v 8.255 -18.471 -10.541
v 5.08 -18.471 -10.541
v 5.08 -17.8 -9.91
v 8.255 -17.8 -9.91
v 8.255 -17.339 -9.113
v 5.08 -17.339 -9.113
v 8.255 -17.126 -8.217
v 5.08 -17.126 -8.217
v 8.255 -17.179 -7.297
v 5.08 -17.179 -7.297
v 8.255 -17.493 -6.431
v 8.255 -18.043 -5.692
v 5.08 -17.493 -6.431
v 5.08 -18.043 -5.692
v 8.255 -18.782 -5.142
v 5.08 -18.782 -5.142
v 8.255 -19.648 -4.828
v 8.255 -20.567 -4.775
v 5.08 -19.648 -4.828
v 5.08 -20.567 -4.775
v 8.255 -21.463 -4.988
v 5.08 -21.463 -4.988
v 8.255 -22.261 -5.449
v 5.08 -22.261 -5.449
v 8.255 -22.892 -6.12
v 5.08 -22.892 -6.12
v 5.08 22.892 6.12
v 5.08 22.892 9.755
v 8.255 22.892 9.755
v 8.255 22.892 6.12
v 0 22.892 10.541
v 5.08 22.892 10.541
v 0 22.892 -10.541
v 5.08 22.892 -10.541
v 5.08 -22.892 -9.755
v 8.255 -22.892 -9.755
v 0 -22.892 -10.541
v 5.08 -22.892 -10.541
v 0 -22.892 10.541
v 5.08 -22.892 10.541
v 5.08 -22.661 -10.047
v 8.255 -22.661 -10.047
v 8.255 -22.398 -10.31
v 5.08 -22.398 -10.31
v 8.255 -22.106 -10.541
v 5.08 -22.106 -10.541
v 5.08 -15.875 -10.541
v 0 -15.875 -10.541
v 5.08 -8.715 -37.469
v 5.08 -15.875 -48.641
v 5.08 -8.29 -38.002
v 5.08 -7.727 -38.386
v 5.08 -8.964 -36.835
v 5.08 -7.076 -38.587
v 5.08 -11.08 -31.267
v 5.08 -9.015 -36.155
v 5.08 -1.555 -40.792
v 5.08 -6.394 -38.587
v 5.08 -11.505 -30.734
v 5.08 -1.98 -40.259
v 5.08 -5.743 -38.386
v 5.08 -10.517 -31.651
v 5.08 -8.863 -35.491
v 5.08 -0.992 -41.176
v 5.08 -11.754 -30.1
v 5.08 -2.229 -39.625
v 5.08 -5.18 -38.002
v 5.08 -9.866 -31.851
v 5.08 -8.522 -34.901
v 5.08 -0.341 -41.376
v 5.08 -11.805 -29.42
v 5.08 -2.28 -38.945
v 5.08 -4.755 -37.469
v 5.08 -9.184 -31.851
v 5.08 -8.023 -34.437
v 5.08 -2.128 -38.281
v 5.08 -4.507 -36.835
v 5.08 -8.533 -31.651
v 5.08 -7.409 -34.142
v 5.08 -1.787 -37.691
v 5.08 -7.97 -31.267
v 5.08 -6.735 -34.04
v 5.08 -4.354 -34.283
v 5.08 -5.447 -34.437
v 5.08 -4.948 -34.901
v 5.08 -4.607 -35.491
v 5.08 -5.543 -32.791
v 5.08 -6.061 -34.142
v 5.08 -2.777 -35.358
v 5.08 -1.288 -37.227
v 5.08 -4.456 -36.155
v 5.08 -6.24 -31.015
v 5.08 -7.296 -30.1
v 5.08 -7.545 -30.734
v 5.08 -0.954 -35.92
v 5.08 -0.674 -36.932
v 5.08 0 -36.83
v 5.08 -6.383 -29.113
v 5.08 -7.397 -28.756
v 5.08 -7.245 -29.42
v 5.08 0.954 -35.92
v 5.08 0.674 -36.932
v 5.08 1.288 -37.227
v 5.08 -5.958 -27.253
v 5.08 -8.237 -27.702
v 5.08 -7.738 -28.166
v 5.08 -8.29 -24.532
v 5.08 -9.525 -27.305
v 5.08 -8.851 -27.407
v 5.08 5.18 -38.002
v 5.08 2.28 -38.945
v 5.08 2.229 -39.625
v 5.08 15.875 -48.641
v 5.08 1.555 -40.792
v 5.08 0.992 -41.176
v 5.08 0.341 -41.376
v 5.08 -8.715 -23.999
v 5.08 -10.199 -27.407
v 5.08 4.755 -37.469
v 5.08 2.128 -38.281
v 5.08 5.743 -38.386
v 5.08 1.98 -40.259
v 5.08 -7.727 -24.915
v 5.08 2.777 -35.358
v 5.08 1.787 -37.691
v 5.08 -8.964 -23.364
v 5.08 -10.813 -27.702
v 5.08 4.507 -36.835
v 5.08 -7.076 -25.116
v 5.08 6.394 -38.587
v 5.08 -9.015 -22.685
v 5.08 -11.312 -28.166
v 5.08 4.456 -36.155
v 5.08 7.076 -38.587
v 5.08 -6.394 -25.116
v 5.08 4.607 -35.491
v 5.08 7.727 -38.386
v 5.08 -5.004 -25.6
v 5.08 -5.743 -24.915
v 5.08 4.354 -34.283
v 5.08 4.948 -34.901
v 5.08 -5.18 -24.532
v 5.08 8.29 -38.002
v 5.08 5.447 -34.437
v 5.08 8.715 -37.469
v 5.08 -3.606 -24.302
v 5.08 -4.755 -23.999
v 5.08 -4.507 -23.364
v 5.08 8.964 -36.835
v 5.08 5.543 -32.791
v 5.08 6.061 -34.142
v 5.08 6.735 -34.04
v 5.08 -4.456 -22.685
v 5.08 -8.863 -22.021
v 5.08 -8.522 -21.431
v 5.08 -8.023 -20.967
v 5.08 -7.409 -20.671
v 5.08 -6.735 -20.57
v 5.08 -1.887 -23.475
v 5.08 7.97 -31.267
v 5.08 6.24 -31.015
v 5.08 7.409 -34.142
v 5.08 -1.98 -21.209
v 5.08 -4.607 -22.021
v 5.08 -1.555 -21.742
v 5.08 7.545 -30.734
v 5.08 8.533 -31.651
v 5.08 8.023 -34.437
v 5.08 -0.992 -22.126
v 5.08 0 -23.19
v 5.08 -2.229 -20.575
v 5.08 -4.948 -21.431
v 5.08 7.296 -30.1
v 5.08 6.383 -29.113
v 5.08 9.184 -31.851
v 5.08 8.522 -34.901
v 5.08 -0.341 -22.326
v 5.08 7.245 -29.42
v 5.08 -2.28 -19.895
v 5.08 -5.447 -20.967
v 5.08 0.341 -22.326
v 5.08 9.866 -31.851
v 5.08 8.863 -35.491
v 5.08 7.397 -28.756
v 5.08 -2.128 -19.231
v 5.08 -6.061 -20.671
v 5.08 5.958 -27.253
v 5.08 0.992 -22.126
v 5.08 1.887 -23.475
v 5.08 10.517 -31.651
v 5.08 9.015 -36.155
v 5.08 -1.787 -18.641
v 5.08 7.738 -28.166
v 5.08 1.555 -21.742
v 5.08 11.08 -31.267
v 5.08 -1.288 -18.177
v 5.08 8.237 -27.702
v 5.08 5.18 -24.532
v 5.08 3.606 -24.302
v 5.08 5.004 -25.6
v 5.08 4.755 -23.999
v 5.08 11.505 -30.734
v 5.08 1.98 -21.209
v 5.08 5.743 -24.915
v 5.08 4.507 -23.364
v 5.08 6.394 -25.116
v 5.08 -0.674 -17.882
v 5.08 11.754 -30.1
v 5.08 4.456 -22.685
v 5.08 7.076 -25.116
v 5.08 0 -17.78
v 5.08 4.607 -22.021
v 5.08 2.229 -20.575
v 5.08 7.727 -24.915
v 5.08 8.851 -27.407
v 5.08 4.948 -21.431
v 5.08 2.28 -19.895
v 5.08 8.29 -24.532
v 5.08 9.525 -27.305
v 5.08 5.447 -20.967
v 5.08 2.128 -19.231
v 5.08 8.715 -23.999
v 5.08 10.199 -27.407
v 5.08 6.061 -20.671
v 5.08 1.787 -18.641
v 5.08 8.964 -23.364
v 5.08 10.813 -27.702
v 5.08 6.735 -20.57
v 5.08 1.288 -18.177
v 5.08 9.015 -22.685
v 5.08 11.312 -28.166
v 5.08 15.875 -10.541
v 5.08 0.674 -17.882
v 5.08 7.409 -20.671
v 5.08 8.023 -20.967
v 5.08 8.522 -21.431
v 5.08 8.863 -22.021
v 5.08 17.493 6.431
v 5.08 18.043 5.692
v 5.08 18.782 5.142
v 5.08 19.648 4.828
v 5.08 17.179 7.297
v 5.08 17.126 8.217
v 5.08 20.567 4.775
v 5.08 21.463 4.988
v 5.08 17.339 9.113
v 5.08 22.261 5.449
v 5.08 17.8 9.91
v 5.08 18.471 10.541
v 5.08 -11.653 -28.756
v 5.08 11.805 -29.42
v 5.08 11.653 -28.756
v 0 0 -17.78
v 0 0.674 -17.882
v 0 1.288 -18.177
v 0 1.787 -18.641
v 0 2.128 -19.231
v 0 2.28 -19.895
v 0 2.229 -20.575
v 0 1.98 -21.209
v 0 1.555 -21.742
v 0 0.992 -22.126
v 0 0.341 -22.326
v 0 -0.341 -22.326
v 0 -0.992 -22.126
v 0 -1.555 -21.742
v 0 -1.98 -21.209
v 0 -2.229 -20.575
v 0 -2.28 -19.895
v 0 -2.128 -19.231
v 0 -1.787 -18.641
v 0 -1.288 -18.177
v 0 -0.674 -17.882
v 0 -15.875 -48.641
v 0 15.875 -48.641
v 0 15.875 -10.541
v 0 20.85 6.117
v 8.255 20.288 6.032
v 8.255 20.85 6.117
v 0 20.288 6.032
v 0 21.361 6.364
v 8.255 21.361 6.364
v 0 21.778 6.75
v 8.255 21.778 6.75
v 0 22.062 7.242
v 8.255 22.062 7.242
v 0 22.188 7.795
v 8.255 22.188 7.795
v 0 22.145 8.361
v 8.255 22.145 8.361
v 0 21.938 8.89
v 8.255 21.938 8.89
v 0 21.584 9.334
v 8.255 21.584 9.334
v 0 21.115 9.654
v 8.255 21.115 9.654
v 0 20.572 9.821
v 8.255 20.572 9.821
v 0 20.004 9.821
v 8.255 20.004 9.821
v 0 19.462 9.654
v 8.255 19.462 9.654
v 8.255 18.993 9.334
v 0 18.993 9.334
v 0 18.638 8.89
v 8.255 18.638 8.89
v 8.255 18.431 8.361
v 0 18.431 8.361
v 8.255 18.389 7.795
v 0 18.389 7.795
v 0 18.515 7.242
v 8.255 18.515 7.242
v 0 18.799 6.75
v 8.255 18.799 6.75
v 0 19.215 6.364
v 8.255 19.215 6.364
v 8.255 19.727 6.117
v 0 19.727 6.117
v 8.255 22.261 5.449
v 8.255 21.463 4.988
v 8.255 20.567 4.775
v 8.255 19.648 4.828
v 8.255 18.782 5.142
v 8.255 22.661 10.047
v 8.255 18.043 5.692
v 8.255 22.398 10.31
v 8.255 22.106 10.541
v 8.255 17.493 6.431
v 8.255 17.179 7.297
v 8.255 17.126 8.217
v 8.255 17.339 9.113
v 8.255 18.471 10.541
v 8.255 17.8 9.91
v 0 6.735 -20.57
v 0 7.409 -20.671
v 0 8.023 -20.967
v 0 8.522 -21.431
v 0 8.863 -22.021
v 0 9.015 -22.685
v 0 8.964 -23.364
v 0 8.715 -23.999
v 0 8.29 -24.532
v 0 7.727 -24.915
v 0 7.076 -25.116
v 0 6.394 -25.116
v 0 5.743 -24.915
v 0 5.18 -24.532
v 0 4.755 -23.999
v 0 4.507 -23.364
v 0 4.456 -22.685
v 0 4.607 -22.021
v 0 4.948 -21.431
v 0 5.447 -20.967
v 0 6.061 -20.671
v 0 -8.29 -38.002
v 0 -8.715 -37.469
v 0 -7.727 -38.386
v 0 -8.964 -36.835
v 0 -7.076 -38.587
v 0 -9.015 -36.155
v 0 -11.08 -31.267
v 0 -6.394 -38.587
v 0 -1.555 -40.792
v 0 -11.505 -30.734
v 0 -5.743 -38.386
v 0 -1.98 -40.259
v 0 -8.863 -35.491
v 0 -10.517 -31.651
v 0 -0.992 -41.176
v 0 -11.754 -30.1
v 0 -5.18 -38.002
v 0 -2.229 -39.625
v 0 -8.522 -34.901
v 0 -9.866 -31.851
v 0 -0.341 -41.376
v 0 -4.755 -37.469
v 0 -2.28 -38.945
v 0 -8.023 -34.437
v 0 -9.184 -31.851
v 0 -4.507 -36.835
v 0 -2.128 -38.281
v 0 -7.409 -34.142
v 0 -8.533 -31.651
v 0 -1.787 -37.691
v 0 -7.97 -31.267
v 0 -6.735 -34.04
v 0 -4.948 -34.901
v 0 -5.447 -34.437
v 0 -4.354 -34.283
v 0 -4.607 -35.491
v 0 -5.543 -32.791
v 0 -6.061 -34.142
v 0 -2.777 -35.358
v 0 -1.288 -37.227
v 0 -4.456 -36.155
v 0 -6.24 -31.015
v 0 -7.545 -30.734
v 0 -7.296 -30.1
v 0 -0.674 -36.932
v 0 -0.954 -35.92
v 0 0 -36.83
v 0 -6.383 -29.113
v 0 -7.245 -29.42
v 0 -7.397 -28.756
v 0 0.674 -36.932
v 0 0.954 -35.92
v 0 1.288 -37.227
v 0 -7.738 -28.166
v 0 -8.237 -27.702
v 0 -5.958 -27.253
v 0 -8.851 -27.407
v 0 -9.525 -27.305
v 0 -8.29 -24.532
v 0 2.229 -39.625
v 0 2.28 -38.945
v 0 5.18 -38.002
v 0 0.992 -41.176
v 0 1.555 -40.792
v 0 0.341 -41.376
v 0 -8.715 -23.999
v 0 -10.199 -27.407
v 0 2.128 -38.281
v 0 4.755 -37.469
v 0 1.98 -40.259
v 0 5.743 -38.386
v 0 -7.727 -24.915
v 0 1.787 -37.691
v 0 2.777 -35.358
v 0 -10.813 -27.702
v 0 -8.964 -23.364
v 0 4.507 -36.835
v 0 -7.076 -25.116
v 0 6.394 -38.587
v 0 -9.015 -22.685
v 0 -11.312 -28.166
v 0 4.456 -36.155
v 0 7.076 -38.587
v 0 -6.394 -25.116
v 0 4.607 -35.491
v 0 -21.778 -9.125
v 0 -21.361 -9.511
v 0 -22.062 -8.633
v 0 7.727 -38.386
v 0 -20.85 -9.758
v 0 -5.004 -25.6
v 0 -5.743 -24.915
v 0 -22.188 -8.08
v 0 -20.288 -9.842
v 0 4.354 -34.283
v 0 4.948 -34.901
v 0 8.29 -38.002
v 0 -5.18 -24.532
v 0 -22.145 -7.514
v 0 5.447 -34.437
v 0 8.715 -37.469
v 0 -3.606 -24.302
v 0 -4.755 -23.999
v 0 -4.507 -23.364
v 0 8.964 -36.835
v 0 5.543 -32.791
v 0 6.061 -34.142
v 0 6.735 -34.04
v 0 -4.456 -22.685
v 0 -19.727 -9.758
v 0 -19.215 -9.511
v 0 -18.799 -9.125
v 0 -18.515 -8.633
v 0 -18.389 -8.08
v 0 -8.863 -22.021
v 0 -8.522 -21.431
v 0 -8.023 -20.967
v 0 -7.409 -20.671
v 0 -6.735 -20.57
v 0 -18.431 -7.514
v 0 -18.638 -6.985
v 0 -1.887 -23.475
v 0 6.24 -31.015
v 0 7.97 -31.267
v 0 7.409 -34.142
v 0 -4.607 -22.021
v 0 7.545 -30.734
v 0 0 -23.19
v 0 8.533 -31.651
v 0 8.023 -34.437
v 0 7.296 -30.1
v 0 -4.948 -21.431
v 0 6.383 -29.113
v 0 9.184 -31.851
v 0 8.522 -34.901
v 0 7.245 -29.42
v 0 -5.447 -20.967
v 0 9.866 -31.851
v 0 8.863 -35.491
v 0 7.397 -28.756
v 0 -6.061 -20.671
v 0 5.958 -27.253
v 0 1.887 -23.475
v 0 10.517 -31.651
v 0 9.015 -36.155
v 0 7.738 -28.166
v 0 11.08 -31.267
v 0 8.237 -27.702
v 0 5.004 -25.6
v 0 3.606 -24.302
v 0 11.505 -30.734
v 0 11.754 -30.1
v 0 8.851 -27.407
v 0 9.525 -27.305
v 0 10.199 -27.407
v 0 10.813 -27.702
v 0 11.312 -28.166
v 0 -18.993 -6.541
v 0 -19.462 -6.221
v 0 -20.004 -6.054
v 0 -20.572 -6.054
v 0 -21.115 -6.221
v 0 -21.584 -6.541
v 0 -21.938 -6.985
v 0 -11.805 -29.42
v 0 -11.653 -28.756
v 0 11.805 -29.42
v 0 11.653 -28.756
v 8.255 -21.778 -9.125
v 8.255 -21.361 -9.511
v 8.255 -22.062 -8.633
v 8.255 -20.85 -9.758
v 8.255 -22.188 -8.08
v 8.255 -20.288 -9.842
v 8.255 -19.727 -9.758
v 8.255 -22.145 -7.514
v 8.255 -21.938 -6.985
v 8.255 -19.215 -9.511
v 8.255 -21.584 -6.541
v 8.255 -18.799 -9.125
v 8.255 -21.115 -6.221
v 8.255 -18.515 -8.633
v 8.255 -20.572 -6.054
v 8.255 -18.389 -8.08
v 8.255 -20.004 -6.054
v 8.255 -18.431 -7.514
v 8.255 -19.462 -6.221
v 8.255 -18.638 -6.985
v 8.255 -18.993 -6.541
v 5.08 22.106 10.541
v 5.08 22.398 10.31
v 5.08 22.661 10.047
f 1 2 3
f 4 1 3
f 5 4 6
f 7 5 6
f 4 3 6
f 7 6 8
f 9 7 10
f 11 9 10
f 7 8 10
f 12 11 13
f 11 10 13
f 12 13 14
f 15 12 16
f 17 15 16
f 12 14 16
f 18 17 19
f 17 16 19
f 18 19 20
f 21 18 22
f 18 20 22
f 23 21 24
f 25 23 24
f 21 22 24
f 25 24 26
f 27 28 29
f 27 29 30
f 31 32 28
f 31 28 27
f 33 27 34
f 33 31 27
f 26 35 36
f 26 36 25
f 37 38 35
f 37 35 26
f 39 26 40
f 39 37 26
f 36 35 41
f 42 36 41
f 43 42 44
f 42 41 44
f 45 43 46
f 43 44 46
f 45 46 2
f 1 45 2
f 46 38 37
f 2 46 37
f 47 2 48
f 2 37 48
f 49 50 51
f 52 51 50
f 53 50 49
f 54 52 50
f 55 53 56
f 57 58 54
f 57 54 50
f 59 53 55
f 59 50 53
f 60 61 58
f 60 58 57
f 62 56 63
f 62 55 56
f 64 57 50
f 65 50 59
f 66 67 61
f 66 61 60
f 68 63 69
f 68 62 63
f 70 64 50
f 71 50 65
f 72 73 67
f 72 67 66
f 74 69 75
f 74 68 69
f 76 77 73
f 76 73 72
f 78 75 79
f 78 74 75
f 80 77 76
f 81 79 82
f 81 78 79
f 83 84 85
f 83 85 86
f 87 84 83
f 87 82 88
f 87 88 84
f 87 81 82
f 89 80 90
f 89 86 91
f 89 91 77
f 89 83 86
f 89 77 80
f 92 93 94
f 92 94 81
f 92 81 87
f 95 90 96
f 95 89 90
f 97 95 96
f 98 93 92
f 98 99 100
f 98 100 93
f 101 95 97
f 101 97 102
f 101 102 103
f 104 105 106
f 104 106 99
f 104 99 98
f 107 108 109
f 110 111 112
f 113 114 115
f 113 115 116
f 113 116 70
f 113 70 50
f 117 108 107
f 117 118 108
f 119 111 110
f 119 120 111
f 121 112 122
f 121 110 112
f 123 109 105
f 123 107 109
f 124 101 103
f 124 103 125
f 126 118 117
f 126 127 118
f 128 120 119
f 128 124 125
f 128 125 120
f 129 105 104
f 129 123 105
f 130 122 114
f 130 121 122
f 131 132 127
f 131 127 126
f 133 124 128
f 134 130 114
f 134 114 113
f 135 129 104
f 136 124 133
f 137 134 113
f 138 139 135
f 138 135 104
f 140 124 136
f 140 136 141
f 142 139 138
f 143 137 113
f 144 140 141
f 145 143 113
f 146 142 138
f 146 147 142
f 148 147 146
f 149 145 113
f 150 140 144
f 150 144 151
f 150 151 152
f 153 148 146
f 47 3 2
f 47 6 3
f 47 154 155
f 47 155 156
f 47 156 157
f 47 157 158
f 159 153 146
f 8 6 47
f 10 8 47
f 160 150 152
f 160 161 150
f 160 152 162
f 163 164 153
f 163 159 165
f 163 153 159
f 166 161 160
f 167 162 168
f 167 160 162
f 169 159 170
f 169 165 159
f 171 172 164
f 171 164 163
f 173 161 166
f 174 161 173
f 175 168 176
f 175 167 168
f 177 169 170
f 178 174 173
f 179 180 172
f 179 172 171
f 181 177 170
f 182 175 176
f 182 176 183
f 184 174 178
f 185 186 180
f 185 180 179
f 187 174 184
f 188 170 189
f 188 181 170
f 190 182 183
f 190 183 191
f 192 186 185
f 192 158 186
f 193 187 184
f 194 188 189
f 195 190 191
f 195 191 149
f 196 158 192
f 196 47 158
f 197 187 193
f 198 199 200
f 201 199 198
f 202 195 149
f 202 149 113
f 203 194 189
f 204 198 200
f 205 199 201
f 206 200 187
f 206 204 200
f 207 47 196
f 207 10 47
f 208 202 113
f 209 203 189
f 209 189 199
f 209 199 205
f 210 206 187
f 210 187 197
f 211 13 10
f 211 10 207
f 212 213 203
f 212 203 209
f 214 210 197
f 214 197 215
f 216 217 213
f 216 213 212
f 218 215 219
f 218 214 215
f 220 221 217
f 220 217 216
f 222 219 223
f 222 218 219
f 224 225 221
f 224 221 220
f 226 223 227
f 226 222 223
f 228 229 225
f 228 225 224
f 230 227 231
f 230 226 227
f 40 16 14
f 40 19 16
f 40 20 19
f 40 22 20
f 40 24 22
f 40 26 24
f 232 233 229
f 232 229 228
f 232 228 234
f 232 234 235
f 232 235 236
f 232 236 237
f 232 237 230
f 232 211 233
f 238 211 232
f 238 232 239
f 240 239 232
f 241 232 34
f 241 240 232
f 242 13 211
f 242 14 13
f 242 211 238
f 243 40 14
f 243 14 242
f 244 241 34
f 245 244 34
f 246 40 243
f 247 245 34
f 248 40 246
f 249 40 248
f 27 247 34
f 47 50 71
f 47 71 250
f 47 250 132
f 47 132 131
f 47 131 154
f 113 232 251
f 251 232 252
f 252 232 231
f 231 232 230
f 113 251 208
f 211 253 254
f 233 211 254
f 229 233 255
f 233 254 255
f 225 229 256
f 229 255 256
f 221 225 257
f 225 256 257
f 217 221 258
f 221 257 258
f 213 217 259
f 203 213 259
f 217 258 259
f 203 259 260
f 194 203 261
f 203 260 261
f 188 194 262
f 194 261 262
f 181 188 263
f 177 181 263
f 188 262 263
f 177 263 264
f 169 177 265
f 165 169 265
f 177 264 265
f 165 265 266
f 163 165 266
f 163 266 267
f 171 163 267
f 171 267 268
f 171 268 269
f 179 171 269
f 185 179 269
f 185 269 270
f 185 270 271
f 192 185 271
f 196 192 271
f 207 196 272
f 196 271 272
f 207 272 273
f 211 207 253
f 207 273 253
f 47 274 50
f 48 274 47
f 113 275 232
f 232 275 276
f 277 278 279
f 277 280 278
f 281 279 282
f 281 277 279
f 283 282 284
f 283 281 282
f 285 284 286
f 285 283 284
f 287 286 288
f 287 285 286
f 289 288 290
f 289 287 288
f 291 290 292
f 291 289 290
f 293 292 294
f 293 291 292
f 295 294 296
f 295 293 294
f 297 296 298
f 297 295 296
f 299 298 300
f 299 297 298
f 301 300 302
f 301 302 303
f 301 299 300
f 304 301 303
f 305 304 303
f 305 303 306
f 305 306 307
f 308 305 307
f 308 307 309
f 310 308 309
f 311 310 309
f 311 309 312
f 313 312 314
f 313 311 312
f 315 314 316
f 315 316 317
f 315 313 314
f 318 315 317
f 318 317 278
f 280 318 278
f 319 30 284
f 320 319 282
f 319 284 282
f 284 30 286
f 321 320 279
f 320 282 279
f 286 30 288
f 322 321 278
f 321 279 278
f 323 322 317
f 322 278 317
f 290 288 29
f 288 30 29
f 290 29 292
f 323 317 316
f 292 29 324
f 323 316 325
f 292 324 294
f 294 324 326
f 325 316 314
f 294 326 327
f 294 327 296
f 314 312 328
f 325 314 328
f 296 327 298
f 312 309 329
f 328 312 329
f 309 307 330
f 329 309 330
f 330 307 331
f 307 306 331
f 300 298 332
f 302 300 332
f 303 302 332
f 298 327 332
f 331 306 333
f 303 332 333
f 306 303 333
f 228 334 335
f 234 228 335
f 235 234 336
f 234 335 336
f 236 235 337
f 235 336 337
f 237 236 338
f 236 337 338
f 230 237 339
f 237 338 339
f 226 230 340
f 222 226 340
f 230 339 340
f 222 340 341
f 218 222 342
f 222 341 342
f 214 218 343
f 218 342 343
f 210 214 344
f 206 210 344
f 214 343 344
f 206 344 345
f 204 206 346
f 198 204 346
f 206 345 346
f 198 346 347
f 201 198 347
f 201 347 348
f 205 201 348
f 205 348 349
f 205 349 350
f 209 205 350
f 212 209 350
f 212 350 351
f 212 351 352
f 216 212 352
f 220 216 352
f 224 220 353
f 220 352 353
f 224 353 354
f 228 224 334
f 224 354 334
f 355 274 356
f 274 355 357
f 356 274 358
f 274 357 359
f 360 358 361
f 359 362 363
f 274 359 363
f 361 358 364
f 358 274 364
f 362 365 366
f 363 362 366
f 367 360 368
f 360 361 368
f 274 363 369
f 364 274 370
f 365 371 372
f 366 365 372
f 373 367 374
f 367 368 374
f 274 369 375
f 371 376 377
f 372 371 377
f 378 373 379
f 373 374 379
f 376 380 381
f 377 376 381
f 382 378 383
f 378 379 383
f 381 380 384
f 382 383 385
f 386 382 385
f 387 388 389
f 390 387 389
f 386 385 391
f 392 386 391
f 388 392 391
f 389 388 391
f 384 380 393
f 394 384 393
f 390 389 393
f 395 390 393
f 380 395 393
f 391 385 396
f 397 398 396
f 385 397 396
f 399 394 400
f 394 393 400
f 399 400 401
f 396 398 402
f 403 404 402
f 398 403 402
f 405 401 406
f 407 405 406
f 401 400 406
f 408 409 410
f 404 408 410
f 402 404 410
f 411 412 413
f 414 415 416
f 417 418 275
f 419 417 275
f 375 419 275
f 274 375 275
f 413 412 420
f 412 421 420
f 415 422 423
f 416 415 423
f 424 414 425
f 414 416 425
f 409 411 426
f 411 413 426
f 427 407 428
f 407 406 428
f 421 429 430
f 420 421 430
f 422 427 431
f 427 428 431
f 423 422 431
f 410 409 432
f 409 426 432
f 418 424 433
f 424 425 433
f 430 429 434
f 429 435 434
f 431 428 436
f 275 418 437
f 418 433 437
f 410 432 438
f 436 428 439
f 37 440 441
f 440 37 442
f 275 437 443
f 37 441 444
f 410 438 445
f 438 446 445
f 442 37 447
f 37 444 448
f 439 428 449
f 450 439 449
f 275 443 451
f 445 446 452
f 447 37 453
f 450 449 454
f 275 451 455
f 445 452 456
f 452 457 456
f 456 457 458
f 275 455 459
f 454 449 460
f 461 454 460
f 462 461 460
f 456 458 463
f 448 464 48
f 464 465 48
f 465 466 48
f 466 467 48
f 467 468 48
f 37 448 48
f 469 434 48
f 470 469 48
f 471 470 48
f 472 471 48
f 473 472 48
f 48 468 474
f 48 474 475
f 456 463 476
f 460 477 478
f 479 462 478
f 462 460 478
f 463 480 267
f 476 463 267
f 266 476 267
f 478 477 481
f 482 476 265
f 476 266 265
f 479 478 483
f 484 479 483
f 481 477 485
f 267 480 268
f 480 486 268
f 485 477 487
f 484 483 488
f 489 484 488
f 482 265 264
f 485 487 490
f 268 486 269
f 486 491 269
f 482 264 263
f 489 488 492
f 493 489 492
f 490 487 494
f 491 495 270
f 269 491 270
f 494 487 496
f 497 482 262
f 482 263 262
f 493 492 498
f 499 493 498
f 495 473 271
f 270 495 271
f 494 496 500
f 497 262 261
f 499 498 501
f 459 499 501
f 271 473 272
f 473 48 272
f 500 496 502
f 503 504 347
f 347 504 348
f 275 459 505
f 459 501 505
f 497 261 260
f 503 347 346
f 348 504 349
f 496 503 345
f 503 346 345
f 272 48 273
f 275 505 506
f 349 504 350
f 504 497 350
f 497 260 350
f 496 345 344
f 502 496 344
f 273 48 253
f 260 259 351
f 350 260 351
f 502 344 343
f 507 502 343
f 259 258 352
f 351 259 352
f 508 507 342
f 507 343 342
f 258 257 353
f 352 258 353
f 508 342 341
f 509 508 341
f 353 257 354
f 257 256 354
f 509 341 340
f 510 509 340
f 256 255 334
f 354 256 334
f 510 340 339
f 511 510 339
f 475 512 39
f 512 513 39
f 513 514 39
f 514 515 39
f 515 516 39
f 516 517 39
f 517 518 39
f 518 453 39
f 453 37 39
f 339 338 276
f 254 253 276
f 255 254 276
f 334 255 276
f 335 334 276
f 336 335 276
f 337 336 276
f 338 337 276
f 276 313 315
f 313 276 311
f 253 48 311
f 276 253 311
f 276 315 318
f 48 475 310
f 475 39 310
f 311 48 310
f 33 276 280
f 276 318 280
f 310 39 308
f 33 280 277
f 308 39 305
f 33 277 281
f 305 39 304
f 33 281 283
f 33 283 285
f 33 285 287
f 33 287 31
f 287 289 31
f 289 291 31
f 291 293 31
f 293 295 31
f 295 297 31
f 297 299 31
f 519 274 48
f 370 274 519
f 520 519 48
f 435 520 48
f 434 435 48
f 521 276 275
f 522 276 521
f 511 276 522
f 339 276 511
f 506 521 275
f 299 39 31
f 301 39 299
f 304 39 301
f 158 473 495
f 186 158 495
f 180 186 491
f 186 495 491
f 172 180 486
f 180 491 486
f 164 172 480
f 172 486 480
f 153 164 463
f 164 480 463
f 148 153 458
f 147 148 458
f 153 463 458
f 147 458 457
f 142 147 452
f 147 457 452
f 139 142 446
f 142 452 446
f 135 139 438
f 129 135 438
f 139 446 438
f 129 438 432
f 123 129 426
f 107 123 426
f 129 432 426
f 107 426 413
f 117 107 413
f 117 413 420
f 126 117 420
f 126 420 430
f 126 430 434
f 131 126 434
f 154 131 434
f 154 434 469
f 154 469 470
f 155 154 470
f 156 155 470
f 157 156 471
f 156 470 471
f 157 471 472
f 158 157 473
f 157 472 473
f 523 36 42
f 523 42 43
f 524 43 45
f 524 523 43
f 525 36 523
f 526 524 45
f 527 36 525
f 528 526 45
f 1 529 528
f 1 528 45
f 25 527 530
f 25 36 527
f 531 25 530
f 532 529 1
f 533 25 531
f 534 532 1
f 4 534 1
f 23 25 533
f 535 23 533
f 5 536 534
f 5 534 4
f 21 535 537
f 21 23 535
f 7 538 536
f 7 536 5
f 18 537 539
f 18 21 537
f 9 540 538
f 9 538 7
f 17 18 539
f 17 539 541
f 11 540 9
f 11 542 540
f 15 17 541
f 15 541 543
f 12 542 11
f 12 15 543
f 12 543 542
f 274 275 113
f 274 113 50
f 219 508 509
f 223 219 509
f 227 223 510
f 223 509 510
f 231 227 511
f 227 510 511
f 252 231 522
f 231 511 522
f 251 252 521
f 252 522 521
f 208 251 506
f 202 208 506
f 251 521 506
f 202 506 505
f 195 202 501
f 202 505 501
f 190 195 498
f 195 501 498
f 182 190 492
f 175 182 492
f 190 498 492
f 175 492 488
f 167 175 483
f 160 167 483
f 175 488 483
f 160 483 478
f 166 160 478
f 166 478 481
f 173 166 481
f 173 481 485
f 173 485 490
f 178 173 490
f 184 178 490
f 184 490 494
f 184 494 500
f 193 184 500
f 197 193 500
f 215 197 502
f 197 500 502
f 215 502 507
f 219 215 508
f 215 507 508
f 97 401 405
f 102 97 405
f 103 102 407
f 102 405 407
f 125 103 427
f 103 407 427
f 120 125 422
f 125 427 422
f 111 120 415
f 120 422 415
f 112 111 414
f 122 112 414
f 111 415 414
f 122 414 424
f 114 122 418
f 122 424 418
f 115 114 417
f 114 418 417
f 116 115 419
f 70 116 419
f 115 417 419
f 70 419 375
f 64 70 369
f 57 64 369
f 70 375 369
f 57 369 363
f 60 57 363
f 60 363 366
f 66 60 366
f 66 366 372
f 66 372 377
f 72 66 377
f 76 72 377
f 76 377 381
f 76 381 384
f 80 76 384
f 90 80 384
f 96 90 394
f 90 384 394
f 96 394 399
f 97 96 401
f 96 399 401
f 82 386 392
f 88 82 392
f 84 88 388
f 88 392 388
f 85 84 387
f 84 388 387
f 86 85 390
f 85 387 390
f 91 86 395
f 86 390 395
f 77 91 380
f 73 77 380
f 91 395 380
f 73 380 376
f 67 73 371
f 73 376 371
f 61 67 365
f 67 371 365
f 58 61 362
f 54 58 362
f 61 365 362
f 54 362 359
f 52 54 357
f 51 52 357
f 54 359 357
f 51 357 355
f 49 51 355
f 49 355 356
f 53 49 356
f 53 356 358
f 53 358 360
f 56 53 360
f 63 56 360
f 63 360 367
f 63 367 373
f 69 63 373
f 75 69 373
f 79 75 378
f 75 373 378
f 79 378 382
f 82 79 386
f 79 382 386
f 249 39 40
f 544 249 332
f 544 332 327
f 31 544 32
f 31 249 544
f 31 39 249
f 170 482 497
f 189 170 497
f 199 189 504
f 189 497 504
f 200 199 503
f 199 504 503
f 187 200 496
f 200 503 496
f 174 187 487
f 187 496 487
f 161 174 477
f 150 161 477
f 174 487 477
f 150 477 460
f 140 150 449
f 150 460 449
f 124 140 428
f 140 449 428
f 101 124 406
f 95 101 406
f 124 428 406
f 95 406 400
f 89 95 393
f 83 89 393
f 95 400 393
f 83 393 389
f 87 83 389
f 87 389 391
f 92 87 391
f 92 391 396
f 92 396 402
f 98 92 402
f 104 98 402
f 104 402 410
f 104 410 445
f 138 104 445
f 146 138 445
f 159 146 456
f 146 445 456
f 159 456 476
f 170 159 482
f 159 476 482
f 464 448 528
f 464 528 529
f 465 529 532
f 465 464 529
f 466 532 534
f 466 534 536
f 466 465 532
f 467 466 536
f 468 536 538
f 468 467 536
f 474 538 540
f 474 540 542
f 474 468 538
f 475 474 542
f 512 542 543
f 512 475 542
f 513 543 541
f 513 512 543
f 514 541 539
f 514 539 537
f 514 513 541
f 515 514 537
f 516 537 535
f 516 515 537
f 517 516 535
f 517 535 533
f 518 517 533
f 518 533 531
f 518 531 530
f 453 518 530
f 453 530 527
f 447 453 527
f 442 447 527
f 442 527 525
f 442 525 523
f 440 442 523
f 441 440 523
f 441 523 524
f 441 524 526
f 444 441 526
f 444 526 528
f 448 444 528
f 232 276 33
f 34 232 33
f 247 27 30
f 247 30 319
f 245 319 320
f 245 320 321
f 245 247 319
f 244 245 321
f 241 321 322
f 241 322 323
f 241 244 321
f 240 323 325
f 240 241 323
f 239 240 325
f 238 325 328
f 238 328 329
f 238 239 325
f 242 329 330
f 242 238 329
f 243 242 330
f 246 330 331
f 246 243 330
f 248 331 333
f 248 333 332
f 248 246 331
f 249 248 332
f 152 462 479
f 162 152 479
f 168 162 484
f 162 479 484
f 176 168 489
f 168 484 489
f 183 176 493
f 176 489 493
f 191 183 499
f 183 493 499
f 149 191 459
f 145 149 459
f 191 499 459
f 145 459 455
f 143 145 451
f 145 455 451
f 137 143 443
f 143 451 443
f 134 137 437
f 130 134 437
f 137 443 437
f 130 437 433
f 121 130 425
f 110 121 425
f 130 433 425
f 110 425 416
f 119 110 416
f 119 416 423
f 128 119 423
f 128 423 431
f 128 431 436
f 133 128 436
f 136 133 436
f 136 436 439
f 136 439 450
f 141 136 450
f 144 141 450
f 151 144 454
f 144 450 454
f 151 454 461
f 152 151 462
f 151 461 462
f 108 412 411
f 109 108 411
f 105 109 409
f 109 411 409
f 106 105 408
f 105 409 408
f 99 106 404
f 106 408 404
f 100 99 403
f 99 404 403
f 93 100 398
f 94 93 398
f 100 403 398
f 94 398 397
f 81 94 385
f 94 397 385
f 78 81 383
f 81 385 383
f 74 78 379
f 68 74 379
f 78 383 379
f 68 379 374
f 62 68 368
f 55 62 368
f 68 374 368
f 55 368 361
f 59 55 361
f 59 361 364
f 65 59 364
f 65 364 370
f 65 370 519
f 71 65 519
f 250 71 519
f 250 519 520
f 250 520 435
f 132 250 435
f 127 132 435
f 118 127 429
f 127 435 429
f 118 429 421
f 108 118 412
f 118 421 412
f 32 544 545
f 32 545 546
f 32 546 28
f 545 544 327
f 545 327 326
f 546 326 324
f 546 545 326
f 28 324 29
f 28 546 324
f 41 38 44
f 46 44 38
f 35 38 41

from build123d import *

# Parameters (mm, degrees)
SKETCH1_W           = 45.7835
SKETCH1_H           = 21.082
SKETCH1_R           = 1.905
BOSS_EXTRUDE1_DEPTH = 5.08
SKETCH2_R           = 1.905
BOSS_EXTRUDE2_DEPTH = 3.175
SKETCH4_W           = 31.75
SKETCH4_H           = 38.1
SKETCH4_R           = 6.4008
SKETCH4_R_2         = 2.286
BOSS_EXTRUDE4_DEPTH = 5.08


with BuildPart() as part:
    # Sketch1 → Boss-Extrude1 (new body)
    with BuildSketch(Plane.YZ):
        Rectangle(SKETCH1_W, SKETCH1_H)
        with Locations(Location((-20.28825, -7.9375, 0), (0, 0, 270))):
            Circle(SKETCH1_R, mode=Mode.SUBTRACT)
        with Locations(Location((20.28825, 7.9375, 0), (0, 0, 270))):
            Circle(SKETCH1_R, mode=Mode.SUBTRACT)
    extrude(amount=BOSS_EXTRUDE1_DEPTH)

    # Sketch2 → Boss-Extrude2 (add)
    # profile 1 of 2: a face of its own
    with BuildSketch(Plane.YZ.offset(5.08)):
        with BuildLine():
            Line((18.470995821, 10.541), (22.105504179, 10.541))
            ThreePointArc((22.105504179, 10.541), (22.53331403, 10.18256403), (22.89175, 9.754754179))
            Line((22.89175, 9.754754179), (22.89175, 6.120245821))
            ThreePointArc((22.89175, 6.120245821), (18.04318597, 5.69243597), (18.470995821, 10.541))
        make_face()
        with Locations(Location((20.28825, 7.9375, 0), (0, 0, 270))):
            Circle(SKETCH2_R, mode=Mode.SUBTRACT)
    # profile 2 of 2: a face of its own
    with BuildSketch(Plane.YZ.offset(5.08)):
        with BuildLine():
            Line((-22.89175, -6.120245821), (-22.89175, -9.754754179))
            ThreePointArc((-22.89175, -9.754754179), (-22.53331403, -10.18256403), (-22.105504179, -10.541))
            Line((-22.105504179, -10.541), (-18.470995821, -10.541))
            ThreePointArc((-18.470995821, -10.541), (-18.04318597, -5.69243597), (-22.89175, -6.120245821))
        make_face()
        with Locations(Location((-20.28825, -7.9375, 0), (0, 0, 270))):
            Circle(SKETCH2_R, mode=Mode.SUBTRACT)
    extrude(amount=BOSS_EXTRUDE2_DEPTH)

    # Sketch4 → Boss-Extrude4 (add)
    with BuildSketch(Plane(origin=(0, 0, 0), x_dir=(0, -1, 0), z_dir=(-1, 0, 0))):
        with Locations((0, -29.591)):
            Rectangle(SKETCH4_W, SKETCH4_H)
        with Locations(Location((0, -29.591, 0), (0, 0, 90))):
            Circle(SKETCH4_R, mode=Mode.SUBTRACT)
        with Locations(Location((0, -20.066, 0), (0, 0, 90))):
            Circle(SKETCH4_R_2, mode=Mode.SUBTRACT)
        with Locations(Location((6.735192091, -22.855807909, 0), (0, 0, 90))):
            Circle(SKETCH4_R_2, mode=Mode.SUBTRACT)
        with Locations(Location((9.525, -29.591, 0), (0, 0, 90))):
            Circle(SKETCH4_R_2, mode=Mode.SUBTRACT)
        with Locations(Location((6.735192091, -36.326192091, 0), (0, 0, 90))):
            Circle(SKETCH4_R_2, mode=Mode.SUBTRACT)
        with Locations(Location((0, -39.116, 0), (0, 0, 90))):
            Circle(SKETCH4_R_2, mode=Mode.SUBTRACT)
        with Locations(Location((-6.735192091, -36.326192091, 0), (0, 0, 90))):
            Circle(SKETCH4_R_2, mode=Mode.SUBTRACT)
        with Locations(Location((-9.525, -29.591, 0), (0, 0, 90))):
            Circle(SKETCH4_R_2, mode=Mode.SUBTRACT)
        with Locations(Location((-6.735192091, -22.855807909, 0), (0, 0, 90))):
            Circle(SKETCH4_R_2, mode=Mode.SUBTRACT)
    extrude(amount=-BOSS_EXTRUDE4_DEPTH)


solid = part.part
